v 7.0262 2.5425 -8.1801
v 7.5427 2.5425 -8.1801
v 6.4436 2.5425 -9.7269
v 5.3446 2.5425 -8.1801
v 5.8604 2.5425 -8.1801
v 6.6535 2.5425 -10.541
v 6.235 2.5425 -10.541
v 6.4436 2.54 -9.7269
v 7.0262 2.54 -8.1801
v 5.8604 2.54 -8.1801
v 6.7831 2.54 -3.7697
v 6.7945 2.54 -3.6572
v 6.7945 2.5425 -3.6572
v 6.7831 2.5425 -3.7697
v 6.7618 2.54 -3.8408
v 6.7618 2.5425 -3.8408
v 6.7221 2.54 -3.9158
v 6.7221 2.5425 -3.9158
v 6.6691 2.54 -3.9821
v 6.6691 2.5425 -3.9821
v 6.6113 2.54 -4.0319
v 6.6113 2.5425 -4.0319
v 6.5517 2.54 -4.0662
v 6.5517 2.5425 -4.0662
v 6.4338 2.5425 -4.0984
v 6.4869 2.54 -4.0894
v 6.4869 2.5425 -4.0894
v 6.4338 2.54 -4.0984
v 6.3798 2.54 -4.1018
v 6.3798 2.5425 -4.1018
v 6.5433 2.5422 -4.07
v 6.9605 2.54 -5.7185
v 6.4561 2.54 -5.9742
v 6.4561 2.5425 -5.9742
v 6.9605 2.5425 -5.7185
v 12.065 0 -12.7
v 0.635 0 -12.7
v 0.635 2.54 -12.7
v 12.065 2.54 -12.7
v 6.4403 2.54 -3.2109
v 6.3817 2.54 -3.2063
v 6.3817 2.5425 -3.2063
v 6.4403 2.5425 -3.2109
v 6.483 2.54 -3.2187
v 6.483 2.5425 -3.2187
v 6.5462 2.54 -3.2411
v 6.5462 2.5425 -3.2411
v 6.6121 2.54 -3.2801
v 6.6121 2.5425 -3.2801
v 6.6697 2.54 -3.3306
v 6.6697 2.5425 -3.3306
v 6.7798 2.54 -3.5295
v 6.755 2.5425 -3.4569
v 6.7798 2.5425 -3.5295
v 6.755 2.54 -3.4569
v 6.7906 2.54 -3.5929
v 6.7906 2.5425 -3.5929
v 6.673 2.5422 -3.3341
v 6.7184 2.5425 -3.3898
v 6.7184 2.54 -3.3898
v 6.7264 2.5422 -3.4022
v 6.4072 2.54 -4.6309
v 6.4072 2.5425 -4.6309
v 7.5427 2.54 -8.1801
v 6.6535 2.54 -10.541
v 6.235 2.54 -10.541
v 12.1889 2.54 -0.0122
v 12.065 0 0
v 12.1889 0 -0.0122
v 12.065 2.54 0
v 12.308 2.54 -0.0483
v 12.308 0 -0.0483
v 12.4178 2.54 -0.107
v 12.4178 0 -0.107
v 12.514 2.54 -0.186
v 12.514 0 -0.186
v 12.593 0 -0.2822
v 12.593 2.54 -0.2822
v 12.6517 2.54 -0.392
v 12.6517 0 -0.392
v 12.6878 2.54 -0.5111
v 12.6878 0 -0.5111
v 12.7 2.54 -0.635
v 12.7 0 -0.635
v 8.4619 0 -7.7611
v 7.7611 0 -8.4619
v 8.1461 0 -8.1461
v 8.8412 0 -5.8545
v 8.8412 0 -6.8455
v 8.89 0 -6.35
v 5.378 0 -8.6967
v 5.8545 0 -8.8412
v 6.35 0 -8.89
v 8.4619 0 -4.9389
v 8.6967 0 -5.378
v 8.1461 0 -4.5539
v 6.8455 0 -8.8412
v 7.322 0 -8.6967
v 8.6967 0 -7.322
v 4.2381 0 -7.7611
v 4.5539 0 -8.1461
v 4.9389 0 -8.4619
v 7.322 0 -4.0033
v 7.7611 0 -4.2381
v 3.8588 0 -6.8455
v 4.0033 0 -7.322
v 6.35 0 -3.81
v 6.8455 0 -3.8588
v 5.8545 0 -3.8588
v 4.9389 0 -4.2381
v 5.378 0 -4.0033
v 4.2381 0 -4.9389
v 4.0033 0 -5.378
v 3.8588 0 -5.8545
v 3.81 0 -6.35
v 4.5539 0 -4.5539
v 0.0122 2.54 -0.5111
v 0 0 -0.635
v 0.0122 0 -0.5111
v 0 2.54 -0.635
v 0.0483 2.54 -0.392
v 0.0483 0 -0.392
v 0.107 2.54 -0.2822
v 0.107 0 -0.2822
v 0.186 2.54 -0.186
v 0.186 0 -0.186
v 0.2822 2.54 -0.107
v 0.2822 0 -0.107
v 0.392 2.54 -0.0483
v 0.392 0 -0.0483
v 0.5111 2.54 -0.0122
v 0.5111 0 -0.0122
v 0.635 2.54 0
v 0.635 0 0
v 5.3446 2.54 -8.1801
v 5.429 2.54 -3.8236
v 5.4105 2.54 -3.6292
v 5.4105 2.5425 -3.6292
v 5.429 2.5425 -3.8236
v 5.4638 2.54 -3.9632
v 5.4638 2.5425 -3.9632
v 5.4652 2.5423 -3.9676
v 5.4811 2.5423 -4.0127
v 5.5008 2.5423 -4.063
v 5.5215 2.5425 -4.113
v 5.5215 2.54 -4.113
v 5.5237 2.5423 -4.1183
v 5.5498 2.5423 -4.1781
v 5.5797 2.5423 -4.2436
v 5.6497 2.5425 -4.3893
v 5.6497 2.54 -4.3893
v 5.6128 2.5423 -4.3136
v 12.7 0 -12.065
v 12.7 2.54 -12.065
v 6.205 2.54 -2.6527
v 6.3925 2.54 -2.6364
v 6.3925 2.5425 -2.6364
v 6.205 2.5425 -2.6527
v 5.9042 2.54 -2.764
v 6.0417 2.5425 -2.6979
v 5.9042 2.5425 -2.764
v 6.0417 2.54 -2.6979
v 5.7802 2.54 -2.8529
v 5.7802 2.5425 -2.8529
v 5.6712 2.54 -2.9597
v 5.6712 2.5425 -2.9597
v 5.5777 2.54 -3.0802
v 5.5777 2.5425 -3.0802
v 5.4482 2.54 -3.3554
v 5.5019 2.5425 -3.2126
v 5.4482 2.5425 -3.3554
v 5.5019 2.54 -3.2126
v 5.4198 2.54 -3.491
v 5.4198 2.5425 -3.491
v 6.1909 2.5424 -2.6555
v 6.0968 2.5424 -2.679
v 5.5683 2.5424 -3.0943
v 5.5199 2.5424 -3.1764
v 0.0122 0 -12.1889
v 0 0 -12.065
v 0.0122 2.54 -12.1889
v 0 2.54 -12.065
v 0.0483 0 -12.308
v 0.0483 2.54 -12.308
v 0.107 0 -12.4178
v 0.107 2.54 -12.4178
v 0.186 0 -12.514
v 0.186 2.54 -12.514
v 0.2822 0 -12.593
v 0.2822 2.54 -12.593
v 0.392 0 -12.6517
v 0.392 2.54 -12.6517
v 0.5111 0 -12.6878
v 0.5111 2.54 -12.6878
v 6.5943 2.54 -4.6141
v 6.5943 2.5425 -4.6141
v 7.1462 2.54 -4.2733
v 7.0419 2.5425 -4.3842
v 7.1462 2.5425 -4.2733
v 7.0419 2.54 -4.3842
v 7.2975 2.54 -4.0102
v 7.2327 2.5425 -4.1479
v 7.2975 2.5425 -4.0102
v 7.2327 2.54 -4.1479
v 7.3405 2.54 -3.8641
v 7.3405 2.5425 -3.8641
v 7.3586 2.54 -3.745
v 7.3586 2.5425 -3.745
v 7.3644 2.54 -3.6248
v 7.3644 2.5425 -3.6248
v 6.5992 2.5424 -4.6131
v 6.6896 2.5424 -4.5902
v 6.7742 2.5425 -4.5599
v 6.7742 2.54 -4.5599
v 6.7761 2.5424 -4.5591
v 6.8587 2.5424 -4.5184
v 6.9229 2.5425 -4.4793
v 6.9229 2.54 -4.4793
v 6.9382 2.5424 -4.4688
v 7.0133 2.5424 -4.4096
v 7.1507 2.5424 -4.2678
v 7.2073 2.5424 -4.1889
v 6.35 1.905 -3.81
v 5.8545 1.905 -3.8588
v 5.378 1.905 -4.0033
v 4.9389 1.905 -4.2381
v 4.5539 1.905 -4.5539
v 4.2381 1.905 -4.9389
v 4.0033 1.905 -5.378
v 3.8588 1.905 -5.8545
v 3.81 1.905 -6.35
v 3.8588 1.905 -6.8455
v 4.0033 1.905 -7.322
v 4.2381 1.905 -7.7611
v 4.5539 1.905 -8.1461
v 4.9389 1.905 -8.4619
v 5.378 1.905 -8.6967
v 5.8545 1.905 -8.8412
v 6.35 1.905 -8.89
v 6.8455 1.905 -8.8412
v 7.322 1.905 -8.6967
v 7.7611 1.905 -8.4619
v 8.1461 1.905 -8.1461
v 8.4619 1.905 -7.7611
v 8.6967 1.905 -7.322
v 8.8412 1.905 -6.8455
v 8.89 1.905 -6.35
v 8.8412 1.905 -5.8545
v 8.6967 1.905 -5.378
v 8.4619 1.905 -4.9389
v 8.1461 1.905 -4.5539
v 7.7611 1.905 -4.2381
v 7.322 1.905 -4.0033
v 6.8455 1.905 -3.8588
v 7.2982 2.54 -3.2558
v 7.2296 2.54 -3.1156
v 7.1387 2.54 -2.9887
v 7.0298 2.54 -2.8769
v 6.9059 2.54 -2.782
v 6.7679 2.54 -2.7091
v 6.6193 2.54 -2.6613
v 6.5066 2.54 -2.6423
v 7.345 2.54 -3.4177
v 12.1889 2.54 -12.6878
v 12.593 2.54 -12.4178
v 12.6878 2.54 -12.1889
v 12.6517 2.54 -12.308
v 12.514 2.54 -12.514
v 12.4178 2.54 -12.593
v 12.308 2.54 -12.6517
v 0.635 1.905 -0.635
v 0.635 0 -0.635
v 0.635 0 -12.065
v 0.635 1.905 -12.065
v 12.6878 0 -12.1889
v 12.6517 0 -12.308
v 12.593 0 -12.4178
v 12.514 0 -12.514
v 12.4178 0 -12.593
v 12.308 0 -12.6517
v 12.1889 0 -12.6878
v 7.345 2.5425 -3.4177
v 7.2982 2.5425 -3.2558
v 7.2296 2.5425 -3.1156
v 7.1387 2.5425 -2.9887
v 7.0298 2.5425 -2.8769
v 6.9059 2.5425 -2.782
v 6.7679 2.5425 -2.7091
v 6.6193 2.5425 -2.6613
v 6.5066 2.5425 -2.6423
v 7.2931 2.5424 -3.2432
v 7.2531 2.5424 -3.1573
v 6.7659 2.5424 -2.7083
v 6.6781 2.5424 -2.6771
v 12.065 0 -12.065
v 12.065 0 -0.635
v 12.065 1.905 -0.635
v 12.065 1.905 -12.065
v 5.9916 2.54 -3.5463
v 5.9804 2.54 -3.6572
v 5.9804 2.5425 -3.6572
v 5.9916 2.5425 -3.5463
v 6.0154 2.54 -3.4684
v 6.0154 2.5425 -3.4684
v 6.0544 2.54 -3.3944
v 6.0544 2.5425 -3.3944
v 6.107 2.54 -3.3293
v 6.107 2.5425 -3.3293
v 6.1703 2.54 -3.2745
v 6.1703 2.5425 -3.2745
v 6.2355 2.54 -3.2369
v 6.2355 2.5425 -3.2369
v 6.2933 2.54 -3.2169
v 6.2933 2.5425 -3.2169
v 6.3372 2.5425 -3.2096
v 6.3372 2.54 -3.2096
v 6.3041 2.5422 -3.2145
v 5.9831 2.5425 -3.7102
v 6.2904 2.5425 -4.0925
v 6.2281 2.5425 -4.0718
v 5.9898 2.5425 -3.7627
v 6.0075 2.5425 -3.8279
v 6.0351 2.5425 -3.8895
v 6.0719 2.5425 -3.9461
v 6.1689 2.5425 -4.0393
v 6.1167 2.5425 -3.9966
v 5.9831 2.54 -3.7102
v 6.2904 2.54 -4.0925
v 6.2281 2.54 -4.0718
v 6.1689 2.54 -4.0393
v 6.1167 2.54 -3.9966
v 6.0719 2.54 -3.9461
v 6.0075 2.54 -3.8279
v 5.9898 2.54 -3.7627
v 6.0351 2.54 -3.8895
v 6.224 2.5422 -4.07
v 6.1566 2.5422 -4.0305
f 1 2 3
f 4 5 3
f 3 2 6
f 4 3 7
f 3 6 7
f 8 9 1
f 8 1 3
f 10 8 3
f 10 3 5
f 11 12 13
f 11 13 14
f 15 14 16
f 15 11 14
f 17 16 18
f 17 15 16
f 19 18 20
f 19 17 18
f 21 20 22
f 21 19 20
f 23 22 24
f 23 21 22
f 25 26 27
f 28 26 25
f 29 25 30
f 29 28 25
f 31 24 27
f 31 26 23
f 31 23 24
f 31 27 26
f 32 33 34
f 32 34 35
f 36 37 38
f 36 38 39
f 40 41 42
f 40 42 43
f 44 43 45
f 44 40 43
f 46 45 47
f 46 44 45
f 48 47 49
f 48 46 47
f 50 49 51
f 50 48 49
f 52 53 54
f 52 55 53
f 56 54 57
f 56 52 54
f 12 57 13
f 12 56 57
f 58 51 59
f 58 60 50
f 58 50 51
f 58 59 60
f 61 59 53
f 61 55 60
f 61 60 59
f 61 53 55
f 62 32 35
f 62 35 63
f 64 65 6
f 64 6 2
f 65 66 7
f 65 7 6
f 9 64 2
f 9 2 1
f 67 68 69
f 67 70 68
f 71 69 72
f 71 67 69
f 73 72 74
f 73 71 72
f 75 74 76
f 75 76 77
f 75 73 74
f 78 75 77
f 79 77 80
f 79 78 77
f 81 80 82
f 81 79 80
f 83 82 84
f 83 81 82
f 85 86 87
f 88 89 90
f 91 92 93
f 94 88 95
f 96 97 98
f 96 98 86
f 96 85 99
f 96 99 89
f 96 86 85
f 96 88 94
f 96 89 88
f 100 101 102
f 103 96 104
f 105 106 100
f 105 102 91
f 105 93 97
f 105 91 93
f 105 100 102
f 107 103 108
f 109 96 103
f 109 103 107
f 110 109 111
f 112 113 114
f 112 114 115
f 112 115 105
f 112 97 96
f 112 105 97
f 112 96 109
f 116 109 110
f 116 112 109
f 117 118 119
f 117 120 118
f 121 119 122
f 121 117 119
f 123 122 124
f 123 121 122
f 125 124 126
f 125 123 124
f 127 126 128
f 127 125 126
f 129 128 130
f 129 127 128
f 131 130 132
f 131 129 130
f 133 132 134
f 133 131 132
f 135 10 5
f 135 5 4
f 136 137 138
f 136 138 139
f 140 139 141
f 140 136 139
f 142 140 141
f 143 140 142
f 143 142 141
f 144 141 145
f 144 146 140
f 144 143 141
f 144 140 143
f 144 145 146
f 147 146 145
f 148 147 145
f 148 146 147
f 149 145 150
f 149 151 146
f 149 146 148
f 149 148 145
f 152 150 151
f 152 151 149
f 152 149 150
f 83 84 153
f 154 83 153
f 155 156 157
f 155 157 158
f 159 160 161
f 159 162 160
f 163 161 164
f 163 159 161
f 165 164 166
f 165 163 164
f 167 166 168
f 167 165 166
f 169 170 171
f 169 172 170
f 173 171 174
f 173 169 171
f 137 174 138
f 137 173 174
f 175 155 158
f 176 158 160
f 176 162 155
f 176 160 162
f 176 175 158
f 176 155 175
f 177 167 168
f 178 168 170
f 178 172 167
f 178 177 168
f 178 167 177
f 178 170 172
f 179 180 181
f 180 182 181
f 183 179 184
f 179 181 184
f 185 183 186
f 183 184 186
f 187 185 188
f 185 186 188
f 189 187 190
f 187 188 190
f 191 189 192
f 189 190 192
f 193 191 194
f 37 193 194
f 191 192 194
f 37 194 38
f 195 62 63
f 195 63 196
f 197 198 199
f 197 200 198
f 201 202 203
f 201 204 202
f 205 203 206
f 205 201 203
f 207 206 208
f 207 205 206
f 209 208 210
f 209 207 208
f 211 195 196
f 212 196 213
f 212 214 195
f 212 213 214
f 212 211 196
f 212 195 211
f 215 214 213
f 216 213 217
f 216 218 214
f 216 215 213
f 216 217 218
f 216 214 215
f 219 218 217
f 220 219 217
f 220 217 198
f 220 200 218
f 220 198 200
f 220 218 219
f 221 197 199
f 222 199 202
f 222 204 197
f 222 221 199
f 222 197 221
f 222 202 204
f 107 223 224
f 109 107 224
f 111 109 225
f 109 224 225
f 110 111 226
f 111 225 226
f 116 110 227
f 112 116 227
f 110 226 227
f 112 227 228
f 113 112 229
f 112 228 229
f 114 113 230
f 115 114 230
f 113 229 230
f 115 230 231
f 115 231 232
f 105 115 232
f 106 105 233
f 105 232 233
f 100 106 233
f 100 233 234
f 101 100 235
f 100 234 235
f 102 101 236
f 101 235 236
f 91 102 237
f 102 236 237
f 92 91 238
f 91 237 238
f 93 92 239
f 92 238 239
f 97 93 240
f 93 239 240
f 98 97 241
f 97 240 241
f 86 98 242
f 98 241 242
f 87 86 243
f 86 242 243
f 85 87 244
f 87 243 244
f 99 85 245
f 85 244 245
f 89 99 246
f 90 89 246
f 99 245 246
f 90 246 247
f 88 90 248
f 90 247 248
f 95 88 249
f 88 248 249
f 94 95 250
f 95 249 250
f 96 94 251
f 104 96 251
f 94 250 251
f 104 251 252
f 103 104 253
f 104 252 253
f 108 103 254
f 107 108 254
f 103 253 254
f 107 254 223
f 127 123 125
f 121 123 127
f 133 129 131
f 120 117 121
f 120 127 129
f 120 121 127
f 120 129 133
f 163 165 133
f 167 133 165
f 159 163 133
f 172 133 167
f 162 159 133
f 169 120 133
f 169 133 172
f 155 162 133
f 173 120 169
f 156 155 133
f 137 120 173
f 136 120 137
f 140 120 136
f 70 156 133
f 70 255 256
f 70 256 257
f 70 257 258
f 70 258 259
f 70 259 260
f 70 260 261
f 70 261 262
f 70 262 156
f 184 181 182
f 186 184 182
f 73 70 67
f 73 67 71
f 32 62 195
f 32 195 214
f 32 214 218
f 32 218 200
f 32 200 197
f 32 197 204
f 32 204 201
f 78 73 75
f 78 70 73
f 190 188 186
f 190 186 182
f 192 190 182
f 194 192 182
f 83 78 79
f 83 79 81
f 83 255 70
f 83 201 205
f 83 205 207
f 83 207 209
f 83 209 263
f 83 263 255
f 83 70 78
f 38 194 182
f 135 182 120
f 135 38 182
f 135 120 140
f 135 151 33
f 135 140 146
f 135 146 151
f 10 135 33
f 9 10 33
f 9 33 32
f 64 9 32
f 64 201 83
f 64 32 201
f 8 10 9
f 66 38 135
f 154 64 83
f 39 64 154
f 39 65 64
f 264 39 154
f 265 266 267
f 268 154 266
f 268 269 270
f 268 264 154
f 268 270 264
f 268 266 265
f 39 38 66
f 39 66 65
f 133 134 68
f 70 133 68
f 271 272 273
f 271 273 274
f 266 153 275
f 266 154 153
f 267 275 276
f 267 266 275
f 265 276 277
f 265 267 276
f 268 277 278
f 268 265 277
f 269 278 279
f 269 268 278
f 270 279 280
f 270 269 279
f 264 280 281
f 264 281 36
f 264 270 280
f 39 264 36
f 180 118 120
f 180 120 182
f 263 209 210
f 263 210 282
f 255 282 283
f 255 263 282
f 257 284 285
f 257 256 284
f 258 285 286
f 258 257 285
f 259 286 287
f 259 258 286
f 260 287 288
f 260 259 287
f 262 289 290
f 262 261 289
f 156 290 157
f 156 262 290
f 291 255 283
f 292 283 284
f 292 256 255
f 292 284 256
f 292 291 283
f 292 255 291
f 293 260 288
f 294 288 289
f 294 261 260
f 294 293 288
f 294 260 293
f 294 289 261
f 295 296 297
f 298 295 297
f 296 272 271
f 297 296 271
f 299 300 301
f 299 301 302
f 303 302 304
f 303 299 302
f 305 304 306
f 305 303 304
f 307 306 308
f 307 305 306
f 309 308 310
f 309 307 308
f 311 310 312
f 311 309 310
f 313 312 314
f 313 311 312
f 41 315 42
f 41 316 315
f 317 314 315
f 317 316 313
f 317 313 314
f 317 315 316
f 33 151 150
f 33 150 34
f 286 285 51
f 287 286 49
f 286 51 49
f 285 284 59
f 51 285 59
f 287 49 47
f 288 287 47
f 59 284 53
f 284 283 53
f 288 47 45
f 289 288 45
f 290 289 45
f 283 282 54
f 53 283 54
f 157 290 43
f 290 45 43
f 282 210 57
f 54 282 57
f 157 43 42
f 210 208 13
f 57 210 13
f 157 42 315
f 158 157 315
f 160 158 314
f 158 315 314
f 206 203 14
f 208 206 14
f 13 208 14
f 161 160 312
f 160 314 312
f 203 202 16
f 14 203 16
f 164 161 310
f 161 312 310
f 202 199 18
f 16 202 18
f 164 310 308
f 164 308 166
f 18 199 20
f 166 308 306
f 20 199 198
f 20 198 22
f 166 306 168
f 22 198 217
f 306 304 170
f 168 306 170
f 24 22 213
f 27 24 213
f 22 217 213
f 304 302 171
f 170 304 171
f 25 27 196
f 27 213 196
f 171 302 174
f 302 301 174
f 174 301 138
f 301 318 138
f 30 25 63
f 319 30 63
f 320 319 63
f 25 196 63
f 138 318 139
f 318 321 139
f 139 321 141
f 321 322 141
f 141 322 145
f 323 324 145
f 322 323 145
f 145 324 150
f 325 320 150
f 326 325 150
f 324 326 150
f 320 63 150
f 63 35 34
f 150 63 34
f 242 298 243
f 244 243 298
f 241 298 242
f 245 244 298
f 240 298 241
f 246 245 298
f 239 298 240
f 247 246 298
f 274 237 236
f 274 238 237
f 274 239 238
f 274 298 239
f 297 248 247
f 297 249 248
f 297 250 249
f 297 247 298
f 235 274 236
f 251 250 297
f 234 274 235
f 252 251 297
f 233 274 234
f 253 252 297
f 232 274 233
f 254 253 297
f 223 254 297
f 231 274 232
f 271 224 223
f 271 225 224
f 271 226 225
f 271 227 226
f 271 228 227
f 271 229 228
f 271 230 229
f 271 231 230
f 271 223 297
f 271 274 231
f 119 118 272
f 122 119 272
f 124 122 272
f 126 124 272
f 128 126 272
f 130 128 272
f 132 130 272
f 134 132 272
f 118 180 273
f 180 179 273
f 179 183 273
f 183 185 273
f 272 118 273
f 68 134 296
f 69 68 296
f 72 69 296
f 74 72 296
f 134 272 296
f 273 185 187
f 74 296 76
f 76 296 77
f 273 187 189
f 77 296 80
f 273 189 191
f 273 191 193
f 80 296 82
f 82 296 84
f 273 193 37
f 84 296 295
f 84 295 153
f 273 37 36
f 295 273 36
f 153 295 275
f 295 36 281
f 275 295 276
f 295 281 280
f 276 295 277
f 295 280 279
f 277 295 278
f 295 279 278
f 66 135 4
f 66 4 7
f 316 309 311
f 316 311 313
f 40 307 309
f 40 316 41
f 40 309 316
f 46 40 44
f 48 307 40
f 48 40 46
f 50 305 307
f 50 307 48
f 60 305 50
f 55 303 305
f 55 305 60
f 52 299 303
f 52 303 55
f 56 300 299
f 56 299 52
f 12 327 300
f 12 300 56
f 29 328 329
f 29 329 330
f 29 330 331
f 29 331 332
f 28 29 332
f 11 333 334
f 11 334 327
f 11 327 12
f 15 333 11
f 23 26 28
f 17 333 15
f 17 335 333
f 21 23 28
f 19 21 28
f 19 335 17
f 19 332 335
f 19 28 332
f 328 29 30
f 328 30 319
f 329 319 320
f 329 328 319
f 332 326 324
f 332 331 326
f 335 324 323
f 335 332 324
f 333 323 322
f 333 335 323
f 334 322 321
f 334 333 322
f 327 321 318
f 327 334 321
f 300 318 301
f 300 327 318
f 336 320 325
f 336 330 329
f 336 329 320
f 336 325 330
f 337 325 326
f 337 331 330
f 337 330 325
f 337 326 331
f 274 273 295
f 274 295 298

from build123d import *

# Parameters (mm, degrees)
SKETCH1_W           = 12.7
SKETCH1_H           = 12.7
BOSS_EXTRUDE1_DEPTH = 2.54
FILLET1_R           = 0.635
SHELL1_START        = 0.635
SHELL1_OUTLINE_W    = 1.905
SHELL1_OUTLINE_H    = 11.43
SHELL1_DEPTH        = 11.43
SKETCH2_R           = 2.54
BOSS_EXTRUDE2_DEPTH = 1.905
BOSS_EXTRUDE4_DEPTH = 0.00254


# Read off the part's stored shape, not the designer's step: Shell1
with BuildPart() as part:
    # Sketch1 → Boss-Extrude1 (new body)
    with BuildSketch(Plane(origin=(0, 0, 0), x_dir=(1, 0, 0), z_dir=(0, 1, 0))):
        with Locations((6.35, 6.35)):
            Rectangle(SKETCH1_W, SKETCH1_H)
    extrude(amount=BOSS_EXTRUDE1_DEPTH)

    # Fillet1
    fillet1_edges = [part.edges().sort_by_distance(p)[0] for p in [
        (0, 1.27, -12.7),
        (12.7, 1.27, -12.7),
        (12.7, 1.27, 0),
        (0, 1.27, 0),
    ]]
    fillet(fillet1_edges, radius=FILLET1_R)

    # Shell1 outline → Shell1 (cut)
    with BuildSketch(Plane.YZ.offset(SHELL1_START)):
        with Locations((0.9525, -6.35)):
            Rectangle(SHELL1_OUTLINE_W, SHELL1_OUTLINE_H)
    extrude(amount=SHELL1_DEPTH, mode=Mode.SUBTRACT)

    # Sketch2 → Boss-Extrude2 (add)
    with BuildSketch(Plane(origin=(0, 1.905, 0), x_dir=(-1, 0, 0), z_dir=(0, -1, 0))):
        with Locations(Location((-6.35, 6.35, 0), (0, 0, 270))):
            Circle(SKETCH2_R)
    extrude(amount=BOSS_EXTRUDE2_DEPTH)

    # Sketch4 → Boss-Extrude4 (add)
    # profile 1 of 2: a face of its own
    with BuildSketch(Plane(origin=(0, 2.54, 0), x_dir=(1, 0, 0), z_dir=(0, 1, 0))):
        with BuildLine():
            Line((6.456138622, 5.974210256), (6.960500601, 5.71853117))
            Line((6.960500601, 5.71853117), (6.407165264, 4.630941026))
            add(Edge.make_bspline(
                [(6.407165264, 4.630941026), (6.439855797, 4.630094651), (6.504245162, 4.628427578), (6.598981047, 4.614954014), (6.689550316, 4.591661453), (6.776866176, 4.560787227), (6.859861273, 4.519322834), (6.939872289, 4.469998775), (7.014829299, 4.40984278), (7.086451002, 4.34319313), (7.151576249, 4.269354895), (7.20814904, 4.190013367), (7.257451228, 4.107098934), (7.295776765, 4.018756598), (7.32669142, 3.926450736), (7.348997703, 3.82981236), (7.361724062, 3.728561626), (7.363478603, 3.659777417), (7.364371795, 3.624761138)],
                knots=[0, 0, 0, 0, 1.013260694, 1.995783107, 2.958651975, 3.908806537, 4.861209129, 5.829647963, 6.817170299, 7.835534541, 8.860094905, 9.863329007, 10.853101798, 11.844815043, 12.84250023, 13.867713965, 14.914507806, 16, 16, 16, 16], degree=3))
            add(Edge.make_bspline(
                [(7.364371795, 3.624761138), (7.3635348, 3.591007569), (7.361880421, 3.524291238), (7.348204784, 3.426301914), (7.326104237, 3.332286889), (7.294518118, 3.242433922), (7.254369605, 3.156303809), (7.205270694, 3.073947091), (7.146814203, 2.995979194), (7.080510488, 2.922814401), (7.008029089, 2.856124152), (6.931629747, 2.796845977), (6.850665063, 2.747879955), (6.766665364, 2.706527002), (6.678084165, 2.675668741), (6.586247088, 2.652376099), (6.490457705, 2.638935234), (6.425438326, 2.63724503), (6.392536859, 2.636389744)],
                knots=[0, 0, 0, 0, 1.049934834, 2.075270938, 3.072134561, 4.05064612, 5.033440221, 6.024524368, 7.028587226, 8.060776465, 9.092543989, 10.090062252, 11.064205434, 12.031961459, 12.998029633, 13.977230324, 14.976426867, 16, 16, 16, 16], degree=3))
            add(Edge.make_bspline(
                [(6.392536859, 2.636389744), (6.358131923, 2.637091632), (6.290479272, 2.6384718), (6.191486511, 2.653926046), (6.096543934, 2.677190259), (6.006185133, 2.710407602), (5.919848194, 2.752703587), (5.838549577, 2.805040616), (5.761604456, 2.866841549), (5.689833178, 2.936715965), (5.625172604, 3.013253826), (5.567500777, 3.092720054), (5.518710337, 3.175239347), (5.479215613, 3.260723478), (5.448400913, 3.348900047), (5.426960167, 3.439936406), (5.412989542, 3.53359108), (5.411351805, 3.597150442), (5.410525641, 3.629213261)],
                knots=[0, 0, 0, 0, 1.063775006, 2.091769615, 3.092589432, 4.084662827, 5.064601646, 6.061867366, 7.070035304, 8.113879863, 9.156342271, 10.166834137, 11.149076039, 12.117706134, 13.076241869, 14.034148791, 15.008317125, 16, 16, 16, 16], degree=3))
            add(Edge.make_bspline(
                [(5.410525641, 3.629213261), (5.41096217, 3.654042164), (5.411837658, 3.703838176), (5.420635786, 3.778404999), (5.434012031, 3.853167552), (5.449516851, 3.916254562), (5.465482147, 3.969601232), (5.481551341, 4.014747076), (5.501465566, 4.064849092), (5.524230475, 4.12003522), (5.550561942, 4.180239071), (5.580322415, 4.245296544), (5.613585986, 4.315700304), (5.637307493, 4.364056786), (5.649668269, 4.389254327)],
                knots=[0, 0, 0, 0, 1.110454016, 2.227089276, 3.35462975, 4.507227546, 5.131400587, 5.845402449, 6.650387134, 7.543487832, 8.516250726, 9.590168902, 10.744287919, 12, 12, 12, 12], degree=3))
            Line((5.649668269, 4.389254327), (6.456138622, 5.974210256))
        make_face()
        with BuildLine():
            add(Edge.make_bspline(
                [(6.379816506, 4.101774359), (6.352472323, 4.100520139), (6.298963346, 4.098065795), (6.222881583, 4.072362713), (6.153512277, 4.032040974), (6.093382105, 3.975885155), (6.043088748, 3.908776745), (6.006131425, 3.832230641), (5.983899541, 3.747268327), (5.981589791, 3.687864094), (5.980397436, 3.657198037)],
                knots=[0, 0, 0, 0, 0.981744412, 1.921144944, 2.858899012, 3.85339082, 4.86292663, 5.863643845, 6.897155691, 8, 8, 8, 8], degree=3))
            add(Edge.make_bspline(
                [(5.980397436, 3.657198037), (5.981809222, 3.626521768), (5.984555239, 3.566854373), (6.007623071, 3.481083067), (6.045392269, 3.402798689), (6.098361161, 3.334800948), (6.160545878, 3.278357558), (6.229501354, 3.236614972), (6.304077387, 3.210971132), (6.35566345, 3.207842243), (6.381724559, 3.206261538)],
                knots=[0, 0, 0, 0, 1.098279937, 2.136227893, 3.159405121, 4.194678092, 5.206500211, 6.154139736, 7.067477469, 8, 8, 8, 8], degree=3))
            add(Edge.make_bspline(
                [(6.381724559, 3.206261538), (6.409248036, 3.207870396), (6.463226355, 3.211025646), (6.54109362, 3.23559044), (6.612225834, 3.276633701), (6.67512047, 3.332896382), (6.729145767, 3.400118178), (6.766525816, 3.478862388), (6.790660084, 3.565252761), (6.79319133, 3.625862449), (6.7945, 3.657198037)],
                knots=[0, 0, 0, 0, 0.96921794, 1.900804717, 2.848419905, 3.844199796, 4.861108892, 5.867439427, 6.897452859, 8, 8, 8, 8], degree=3))
            add(Edge.make_bspline(
                [(6.7945, 3.657198037), (6.793009186, 3.687846189), (6.79012205, 3.747199913), (6.768436237, 3.832560256), (6.729717682, 3.908811323), (6.678286397, 3.976162168), (6.616086864, 4.032292947), (6.543941256, 4.072680703), (6.464383952, 4.098020258), (6.408416654, 4.100504747), (6.379816506, 4.101774359)],
                knots=[0, 0, 0, 0, 1.083229974, 2.097801324, 3.086792542, 4.086858909, 5.079819718, 6.026392613, 6.991456328, 8, 8, 8, 8], degree=3))
        make_face(mode=Mode.SUBTRACT)
    # profile 2 of 2: a face of its own
    with BuildSketch(Plane(origin=(0, 2.54, 0), x_dir=(1, 0, 0), z_dir=(0, 1, 0))):
        Polygon((6.235008013, 10.541), (6.653507612, 10.541), (7.542660256, 8.180102564), (7.026213942, 8.180102564), (6.443621795, 9.726897436), (5.86039363, 8.180102564), (5.344583333, 8.180102564), align=None)
    extrude(amount=BOSS_EXTRUDE4_DEPTH)


solid = part.part
